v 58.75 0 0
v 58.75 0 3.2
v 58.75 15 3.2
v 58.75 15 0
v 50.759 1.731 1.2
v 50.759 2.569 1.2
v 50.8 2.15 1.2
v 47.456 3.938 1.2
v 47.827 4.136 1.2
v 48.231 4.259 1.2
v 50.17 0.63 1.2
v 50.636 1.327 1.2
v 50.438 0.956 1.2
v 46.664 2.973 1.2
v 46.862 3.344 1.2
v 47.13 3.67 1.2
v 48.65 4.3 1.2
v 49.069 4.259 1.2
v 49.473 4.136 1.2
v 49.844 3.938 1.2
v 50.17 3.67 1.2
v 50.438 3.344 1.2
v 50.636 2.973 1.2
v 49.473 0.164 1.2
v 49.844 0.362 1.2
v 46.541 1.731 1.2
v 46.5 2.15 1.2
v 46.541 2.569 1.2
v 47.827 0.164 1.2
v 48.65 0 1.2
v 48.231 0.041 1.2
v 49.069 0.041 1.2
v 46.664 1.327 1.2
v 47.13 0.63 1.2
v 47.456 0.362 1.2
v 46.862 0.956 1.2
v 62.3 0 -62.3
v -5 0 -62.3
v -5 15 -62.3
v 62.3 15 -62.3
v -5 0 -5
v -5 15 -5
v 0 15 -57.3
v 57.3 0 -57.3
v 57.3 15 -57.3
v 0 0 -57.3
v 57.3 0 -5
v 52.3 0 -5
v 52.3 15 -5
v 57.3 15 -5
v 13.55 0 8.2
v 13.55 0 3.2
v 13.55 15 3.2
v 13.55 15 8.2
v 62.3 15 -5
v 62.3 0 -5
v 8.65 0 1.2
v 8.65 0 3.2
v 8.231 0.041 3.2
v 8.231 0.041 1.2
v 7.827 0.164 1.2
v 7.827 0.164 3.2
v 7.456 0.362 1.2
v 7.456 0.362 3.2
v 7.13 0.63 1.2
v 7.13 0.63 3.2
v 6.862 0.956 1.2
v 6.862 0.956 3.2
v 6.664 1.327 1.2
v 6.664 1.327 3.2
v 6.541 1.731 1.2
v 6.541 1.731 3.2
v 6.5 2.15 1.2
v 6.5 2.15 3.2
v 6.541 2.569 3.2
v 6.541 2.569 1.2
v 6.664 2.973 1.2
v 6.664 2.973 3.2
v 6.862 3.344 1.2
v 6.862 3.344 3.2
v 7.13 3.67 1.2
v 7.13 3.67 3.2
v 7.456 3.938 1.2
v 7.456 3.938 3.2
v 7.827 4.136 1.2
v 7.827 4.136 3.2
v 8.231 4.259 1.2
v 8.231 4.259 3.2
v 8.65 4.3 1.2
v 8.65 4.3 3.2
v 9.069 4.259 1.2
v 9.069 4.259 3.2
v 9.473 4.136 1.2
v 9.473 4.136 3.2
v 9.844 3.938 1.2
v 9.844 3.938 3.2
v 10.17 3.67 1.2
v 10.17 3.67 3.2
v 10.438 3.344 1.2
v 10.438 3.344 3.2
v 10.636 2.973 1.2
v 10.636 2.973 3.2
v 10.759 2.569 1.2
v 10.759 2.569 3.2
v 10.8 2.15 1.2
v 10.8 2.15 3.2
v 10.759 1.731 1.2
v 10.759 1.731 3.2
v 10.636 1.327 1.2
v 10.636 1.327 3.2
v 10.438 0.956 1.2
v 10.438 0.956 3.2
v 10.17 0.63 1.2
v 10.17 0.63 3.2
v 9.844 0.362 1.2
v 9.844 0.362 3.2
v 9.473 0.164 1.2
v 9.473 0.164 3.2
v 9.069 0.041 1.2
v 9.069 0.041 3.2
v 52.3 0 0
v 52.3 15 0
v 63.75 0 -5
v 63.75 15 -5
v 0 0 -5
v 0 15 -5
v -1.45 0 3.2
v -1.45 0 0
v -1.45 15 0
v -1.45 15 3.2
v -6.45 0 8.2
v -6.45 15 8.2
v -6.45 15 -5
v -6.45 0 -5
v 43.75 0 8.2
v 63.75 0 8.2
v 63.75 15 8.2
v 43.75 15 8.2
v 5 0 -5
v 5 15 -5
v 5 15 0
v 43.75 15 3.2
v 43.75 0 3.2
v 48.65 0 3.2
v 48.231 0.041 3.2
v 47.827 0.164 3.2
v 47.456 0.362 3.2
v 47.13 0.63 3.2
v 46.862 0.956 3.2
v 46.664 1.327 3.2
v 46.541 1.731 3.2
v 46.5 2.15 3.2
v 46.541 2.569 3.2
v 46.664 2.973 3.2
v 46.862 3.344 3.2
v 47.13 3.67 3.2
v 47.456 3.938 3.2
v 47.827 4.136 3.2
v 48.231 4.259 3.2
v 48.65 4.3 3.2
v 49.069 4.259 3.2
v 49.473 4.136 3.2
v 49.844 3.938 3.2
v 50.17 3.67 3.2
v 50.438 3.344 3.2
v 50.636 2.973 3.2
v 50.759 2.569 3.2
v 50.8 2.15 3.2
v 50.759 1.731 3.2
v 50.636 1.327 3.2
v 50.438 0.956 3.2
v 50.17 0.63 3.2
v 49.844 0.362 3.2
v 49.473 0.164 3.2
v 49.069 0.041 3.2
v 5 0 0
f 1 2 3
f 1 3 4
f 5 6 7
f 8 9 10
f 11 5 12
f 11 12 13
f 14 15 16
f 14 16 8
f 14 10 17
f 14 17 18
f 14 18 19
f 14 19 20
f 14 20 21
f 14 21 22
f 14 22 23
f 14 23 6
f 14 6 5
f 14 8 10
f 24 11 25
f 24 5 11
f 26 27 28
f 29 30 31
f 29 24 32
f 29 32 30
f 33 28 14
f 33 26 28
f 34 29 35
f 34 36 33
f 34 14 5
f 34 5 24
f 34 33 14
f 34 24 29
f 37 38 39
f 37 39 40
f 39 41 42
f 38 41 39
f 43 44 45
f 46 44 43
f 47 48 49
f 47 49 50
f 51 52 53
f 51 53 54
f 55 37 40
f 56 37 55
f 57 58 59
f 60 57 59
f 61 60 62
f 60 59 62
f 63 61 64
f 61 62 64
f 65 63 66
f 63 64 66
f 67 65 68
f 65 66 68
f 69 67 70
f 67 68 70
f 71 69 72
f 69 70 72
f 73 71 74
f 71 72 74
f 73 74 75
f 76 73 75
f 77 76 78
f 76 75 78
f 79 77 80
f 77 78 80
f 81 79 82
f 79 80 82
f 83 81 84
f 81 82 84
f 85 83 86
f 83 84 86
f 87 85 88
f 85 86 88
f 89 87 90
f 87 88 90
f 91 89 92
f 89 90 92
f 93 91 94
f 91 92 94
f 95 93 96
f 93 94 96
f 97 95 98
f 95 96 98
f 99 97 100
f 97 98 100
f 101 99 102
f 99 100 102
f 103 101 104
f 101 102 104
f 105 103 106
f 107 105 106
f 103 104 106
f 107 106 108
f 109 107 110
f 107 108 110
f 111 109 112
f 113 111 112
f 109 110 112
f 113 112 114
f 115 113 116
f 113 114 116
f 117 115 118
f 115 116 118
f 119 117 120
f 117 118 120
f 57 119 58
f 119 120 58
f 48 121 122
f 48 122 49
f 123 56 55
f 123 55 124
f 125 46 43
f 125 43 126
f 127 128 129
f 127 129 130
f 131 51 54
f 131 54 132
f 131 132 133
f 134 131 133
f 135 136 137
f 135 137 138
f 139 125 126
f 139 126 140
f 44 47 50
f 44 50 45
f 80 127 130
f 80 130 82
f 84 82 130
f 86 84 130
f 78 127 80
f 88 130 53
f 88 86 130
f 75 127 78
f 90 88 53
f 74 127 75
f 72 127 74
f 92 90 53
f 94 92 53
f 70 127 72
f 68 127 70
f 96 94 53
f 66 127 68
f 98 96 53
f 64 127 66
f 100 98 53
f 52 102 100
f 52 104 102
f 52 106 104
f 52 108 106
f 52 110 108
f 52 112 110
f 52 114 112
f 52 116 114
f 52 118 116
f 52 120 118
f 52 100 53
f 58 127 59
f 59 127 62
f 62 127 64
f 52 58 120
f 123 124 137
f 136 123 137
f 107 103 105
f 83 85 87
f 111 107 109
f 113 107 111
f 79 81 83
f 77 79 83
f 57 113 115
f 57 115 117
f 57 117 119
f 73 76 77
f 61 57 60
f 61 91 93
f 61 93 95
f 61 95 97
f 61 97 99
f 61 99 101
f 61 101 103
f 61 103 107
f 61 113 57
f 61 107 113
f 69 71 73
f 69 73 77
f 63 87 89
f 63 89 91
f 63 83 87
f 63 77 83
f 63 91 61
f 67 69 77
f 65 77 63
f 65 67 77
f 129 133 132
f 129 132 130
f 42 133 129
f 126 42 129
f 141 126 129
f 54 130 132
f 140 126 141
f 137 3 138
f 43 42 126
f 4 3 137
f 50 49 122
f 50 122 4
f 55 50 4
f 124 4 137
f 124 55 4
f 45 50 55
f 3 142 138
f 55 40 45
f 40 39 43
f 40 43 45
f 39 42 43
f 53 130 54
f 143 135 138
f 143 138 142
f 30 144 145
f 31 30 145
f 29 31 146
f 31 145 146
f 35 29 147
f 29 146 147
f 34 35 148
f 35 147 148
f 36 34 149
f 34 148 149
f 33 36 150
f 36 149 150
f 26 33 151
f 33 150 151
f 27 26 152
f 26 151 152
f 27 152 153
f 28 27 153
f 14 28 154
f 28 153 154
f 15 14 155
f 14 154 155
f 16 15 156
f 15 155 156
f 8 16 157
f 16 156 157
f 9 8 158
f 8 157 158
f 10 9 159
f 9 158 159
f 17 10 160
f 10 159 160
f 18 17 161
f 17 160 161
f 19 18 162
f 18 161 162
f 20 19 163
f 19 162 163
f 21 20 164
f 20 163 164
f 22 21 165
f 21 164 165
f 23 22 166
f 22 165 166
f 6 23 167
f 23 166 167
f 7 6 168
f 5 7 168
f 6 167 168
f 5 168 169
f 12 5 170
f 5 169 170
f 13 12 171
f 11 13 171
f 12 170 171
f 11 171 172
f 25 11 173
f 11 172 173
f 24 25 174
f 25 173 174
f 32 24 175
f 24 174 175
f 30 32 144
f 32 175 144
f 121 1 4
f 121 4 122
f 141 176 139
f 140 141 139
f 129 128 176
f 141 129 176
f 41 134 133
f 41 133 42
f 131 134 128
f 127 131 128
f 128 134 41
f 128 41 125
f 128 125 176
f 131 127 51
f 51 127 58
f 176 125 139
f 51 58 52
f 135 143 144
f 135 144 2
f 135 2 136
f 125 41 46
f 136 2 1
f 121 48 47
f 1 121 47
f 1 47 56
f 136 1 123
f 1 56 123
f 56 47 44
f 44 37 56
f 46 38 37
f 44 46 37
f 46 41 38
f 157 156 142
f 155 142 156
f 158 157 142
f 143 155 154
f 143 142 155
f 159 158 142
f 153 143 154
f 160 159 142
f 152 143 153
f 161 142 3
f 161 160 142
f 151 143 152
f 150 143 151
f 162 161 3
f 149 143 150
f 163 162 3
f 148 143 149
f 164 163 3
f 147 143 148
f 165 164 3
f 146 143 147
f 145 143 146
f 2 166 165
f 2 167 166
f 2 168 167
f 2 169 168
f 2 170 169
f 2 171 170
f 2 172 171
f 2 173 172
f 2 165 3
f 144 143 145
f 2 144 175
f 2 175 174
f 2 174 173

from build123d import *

# Parameters (mm, degrees)
EXTRUDE_1_DEPTH = 15
SKETCH_3_W      = 5
SKETCH_3_H      = 5
EXTRUDE_3_DEPTH = 15
SKETCH_4_R      = 2.15
EXTRUDE_4_DEPTH = 2


with BuildPart() as part:
    # Эскиз1 → Вытянуть1 (new body)
    with BuildSketch(Plane(origin=(0, 0, 0), x_dir=(1, 0, 0), z_dir=(0, 1, 0))):
        Polygon((-5, 5), (-5, 62.3), (62.3, 62.3), (62.3, 5), (63.75, 5), (63.75, -8.2), (43.75, -8.2), (43.75, -3.2), (58.75, -3.2), (58.75, 0), (57.3, 0), (57.3, 57.3), (0, 57.3), (0, 0), (-1.45, 0), (-1.45, -3.2), (13.55, -3.2), (13.55, -8.2), (-6.45, -8.2), (-6.45, 5), align=None)
    extrude(amount=EXTRUDE_1_DEPTH)

    # Эскиз3 → Вытянуть3 (add)
    with BuildSketch(Plane(origin=(0, 0, 0), x_dir=(1, 0, 0), z_dir=(0, 1, 0))):
        with Locations((2.5, 2.5)):
            Rectangle(SKETCH_3_W, SKETCH_3_H)
        with Locations((54.8, 2.5)):
            Rectangle(SKETCH_3_W, SKETCH_3_H)
    extrude(amount=EXTRUDE_3_DEPTH)

    # Эскиз4 → Вытянуть4 (add)
    with BuildSketch(Plane(origin=(0, 0, 3.2), x_dir=(-1, 0, 0), z_dir=(0, 0, -1))):
        with Locations(Location((-8.65, 2.15, 0), (0, 0, 270))):
            Circle(SKETCH_4_R)
        with Locations(Location((-48.65, 2.15, 0), (0, 0, 270))):
            Circle(SKETCH_4_R)
    extrude(amount=EXTRUDE_4_DEPTH)


solid = part.part
